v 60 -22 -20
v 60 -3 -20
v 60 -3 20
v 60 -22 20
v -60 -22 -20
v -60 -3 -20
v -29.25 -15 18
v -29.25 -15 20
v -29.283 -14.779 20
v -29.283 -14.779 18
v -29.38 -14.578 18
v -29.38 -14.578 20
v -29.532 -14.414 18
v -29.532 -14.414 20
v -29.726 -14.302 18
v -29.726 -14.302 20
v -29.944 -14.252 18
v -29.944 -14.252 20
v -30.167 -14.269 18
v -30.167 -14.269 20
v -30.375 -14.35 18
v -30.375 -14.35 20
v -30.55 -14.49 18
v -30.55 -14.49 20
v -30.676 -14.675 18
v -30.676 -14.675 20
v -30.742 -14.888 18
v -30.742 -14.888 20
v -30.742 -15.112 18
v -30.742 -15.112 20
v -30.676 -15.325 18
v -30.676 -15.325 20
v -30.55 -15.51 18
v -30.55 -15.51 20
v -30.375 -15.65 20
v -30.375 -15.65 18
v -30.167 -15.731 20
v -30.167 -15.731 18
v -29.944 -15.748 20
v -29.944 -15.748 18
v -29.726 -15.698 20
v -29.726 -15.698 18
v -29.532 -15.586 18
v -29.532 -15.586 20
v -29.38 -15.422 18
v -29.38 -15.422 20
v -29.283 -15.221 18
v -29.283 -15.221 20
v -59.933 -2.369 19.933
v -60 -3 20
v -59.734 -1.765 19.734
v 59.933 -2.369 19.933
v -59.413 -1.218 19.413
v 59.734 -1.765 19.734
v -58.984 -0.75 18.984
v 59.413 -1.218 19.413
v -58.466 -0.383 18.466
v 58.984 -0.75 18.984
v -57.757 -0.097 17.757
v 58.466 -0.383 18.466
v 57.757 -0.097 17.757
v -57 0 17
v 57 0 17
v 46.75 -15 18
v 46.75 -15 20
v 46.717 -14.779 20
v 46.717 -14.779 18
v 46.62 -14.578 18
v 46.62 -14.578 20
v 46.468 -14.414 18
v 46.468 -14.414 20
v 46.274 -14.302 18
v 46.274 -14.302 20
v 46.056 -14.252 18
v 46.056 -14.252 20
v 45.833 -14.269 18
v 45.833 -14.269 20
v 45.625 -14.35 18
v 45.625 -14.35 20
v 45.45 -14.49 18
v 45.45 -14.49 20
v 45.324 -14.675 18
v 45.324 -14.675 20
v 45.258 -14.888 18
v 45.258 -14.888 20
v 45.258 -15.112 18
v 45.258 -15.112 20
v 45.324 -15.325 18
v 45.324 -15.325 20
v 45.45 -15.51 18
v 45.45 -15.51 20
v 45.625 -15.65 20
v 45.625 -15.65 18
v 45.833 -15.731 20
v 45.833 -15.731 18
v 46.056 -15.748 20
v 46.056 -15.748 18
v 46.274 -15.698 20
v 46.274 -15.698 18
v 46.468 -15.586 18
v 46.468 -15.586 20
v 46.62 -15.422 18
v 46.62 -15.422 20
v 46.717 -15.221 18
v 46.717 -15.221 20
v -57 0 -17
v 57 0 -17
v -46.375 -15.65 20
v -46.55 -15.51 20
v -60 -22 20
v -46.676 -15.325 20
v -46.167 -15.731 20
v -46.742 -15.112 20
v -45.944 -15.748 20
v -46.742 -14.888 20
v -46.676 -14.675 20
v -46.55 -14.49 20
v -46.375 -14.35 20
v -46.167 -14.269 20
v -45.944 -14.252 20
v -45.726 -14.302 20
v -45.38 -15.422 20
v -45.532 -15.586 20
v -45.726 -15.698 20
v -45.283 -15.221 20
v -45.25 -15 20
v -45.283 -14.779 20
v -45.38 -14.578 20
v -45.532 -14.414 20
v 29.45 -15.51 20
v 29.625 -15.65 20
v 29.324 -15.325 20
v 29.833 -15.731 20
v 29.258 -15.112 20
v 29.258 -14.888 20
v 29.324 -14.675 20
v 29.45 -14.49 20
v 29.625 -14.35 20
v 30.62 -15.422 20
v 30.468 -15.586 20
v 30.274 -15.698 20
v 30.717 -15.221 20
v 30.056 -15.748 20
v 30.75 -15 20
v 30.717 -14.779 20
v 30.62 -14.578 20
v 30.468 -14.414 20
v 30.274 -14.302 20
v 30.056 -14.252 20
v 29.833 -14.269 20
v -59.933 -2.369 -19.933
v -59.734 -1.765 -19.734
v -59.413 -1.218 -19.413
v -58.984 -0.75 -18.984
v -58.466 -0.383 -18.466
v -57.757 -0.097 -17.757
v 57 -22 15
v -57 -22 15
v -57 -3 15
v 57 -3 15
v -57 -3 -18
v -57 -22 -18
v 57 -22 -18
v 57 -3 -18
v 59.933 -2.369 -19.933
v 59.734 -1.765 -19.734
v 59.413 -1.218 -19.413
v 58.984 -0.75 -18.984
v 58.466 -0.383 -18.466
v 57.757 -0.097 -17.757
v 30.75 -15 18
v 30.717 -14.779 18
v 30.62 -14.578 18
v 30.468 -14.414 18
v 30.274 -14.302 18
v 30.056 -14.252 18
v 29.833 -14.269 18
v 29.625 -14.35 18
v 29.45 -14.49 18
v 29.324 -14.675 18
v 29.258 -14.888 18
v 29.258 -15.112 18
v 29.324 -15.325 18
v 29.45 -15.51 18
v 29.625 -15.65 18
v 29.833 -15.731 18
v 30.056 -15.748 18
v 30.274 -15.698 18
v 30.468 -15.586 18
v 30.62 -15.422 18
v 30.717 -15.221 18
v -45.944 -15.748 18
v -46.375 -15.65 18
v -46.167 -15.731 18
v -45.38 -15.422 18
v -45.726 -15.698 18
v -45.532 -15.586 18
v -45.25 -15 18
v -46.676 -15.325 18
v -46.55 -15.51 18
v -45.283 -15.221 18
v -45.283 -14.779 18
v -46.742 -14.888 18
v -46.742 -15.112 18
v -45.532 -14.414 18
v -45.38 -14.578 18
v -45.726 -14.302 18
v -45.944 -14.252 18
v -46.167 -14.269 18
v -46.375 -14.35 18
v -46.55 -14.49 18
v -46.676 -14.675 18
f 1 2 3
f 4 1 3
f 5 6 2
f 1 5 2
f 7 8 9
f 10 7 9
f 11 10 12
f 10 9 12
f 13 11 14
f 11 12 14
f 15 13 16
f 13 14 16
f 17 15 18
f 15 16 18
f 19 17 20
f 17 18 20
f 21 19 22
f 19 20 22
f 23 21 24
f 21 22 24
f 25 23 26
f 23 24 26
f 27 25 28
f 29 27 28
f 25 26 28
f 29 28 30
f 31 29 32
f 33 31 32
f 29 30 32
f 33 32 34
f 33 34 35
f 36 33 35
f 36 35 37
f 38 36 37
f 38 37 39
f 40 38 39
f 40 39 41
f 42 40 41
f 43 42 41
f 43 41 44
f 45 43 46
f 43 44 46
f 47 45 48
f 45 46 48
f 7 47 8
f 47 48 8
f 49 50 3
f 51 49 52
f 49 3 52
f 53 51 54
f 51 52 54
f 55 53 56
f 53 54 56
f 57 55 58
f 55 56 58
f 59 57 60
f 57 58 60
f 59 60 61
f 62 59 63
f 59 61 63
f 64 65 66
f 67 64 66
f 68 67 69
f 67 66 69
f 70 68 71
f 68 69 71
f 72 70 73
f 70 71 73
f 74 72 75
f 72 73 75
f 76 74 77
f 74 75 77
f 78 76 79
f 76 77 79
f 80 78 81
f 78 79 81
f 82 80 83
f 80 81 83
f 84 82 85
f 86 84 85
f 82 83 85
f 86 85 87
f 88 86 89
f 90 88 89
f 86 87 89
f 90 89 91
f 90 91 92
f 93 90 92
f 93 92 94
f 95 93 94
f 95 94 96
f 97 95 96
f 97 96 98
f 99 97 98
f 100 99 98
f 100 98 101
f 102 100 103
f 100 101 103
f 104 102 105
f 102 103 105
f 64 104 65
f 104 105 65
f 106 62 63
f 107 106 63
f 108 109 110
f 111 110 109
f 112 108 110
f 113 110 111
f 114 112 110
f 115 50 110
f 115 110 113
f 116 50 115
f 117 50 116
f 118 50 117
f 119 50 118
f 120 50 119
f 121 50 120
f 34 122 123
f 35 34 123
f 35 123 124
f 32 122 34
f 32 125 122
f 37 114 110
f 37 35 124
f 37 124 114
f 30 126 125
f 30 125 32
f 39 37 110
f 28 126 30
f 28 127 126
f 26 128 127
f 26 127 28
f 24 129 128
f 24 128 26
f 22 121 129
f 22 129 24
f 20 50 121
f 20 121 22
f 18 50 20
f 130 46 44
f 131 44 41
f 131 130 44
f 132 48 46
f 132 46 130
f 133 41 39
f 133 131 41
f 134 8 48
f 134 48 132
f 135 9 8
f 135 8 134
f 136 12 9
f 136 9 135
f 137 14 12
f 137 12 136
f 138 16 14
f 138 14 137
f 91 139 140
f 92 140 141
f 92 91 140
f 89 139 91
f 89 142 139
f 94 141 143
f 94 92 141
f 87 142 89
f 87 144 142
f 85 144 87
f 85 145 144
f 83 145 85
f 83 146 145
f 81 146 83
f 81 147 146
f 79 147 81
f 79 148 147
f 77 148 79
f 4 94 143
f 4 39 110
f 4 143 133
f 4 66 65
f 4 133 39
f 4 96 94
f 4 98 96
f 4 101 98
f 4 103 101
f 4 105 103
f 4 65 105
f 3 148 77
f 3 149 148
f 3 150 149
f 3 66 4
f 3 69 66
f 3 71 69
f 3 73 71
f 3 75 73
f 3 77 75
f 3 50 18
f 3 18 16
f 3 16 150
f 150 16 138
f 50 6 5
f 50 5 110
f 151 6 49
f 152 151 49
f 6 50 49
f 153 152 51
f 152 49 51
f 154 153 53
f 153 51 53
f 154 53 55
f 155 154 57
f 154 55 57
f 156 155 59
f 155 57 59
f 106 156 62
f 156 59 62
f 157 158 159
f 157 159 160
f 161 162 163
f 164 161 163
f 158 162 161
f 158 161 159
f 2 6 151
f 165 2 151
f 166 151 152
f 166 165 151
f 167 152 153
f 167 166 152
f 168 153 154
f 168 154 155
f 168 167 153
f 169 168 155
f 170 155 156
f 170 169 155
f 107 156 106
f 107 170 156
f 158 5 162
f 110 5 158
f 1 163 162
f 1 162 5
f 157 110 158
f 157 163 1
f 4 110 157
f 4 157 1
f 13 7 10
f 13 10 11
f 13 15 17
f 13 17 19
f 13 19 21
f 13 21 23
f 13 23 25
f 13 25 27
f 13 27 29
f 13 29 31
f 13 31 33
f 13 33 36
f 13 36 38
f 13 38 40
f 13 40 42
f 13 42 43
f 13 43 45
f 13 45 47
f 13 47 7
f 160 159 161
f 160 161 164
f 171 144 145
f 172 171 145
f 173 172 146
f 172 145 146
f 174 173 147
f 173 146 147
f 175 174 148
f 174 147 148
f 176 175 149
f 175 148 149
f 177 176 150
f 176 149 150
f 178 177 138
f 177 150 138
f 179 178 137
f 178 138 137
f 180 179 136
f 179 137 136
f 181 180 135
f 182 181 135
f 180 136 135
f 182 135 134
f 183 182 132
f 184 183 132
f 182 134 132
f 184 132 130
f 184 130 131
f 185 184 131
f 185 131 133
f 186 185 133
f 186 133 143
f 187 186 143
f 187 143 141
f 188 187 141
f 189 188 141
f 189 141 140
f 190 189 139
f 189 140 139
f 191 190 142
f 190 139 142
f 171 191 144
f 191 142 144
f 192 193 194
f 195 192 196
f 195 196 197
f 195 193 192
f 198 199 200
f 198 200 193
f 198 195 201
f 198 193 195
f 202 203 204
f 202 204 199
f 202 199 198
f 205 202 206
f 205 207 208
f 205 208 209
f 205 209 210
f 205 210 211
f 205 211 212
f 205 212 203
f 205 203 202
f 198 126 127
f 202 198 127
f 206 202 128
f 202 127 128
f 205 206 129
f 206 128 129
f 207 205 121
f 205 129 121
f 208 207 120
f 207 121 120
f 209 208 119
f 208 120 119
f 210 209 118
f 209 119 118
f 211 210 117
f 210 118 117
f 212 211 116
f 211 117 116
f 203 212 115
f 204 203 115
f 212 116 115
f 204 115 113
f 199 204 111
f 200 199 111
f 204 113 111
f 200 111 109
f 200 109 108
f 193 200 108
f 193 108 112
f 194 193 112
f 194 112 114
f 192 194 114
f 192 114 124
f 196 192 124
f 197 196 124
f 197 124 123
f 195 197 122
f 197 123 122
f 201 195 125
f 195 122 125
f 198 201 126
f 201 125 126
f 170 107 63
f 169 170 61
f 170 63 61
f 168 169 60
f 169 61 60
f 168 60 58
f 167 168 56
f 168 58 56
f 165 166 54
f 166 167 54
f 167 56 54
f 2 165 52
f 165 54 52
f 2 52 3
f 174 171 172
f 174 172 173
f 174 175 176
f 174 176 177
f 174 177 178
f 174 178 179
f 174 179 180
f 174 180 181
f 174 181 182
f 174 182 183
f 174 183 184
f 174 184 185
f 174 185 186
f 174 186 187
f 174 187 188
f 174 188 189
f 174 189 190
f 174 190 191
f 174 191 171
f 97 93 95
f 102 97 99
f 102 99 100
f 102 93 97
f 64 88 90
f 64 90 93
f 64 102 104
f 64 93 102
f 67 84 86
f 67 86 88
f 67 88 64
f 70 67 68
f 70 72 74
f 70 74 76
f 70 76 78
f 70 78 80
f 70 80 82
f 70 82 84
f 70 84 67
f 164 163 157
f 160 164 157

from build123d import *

# Parameters (mm, degrees)
F0_W     = 120
F0_H     = 40
F1_DEPTH = 22
F2_W     = 114
F2_H     = 33
F3_DEPTH = 19
F4_R     = 3
F5_R     = 0.75
F6_DEPTH = 2


with BuildPart() as f1:
    # F0 (on Front) → F1 (new body)
    with BuildSketch(Plane.XZ):
        Rectangle(F0_W, F0_H)
    extrude(amount=F1_DEPTH)

    # F2 (on face) → F3 (cut)
    with BuildSketch(Plane.XZ.offset(22)):
        with Locations((0, -1.5)):
            Rectangle(F2_W, F2_H)
    extrude(amount=-F3_DEPTH, mode=Mode.SUBTRACT)

    # F4
    f4_edges = [f1.edges().sort_by_distance(p)[0] for p in [
        (0, 0, 20),
        (-60, 0, 0),
        (0, 0, -20),
        (60, 0, 0),
    ]]
    fillet(f4_edges, radius=F4_R)

    # F5 (on face) → F6 (cut)
    with BuildSketch(Plane.XY.offset(20)):
        with Locations((-46, -15)):
            Circle(F5_R)
        with Locations((-30, -15)):
            Circle(F5_R)
        with Locations((30, -15)):
            Circle(F5_R)
        with Locations((46, -15)):
            Circle(F5_R)
    extrude(amount=-F6_DEPTH, mode=Mode.SUBTRACT)


solid = f1.part
